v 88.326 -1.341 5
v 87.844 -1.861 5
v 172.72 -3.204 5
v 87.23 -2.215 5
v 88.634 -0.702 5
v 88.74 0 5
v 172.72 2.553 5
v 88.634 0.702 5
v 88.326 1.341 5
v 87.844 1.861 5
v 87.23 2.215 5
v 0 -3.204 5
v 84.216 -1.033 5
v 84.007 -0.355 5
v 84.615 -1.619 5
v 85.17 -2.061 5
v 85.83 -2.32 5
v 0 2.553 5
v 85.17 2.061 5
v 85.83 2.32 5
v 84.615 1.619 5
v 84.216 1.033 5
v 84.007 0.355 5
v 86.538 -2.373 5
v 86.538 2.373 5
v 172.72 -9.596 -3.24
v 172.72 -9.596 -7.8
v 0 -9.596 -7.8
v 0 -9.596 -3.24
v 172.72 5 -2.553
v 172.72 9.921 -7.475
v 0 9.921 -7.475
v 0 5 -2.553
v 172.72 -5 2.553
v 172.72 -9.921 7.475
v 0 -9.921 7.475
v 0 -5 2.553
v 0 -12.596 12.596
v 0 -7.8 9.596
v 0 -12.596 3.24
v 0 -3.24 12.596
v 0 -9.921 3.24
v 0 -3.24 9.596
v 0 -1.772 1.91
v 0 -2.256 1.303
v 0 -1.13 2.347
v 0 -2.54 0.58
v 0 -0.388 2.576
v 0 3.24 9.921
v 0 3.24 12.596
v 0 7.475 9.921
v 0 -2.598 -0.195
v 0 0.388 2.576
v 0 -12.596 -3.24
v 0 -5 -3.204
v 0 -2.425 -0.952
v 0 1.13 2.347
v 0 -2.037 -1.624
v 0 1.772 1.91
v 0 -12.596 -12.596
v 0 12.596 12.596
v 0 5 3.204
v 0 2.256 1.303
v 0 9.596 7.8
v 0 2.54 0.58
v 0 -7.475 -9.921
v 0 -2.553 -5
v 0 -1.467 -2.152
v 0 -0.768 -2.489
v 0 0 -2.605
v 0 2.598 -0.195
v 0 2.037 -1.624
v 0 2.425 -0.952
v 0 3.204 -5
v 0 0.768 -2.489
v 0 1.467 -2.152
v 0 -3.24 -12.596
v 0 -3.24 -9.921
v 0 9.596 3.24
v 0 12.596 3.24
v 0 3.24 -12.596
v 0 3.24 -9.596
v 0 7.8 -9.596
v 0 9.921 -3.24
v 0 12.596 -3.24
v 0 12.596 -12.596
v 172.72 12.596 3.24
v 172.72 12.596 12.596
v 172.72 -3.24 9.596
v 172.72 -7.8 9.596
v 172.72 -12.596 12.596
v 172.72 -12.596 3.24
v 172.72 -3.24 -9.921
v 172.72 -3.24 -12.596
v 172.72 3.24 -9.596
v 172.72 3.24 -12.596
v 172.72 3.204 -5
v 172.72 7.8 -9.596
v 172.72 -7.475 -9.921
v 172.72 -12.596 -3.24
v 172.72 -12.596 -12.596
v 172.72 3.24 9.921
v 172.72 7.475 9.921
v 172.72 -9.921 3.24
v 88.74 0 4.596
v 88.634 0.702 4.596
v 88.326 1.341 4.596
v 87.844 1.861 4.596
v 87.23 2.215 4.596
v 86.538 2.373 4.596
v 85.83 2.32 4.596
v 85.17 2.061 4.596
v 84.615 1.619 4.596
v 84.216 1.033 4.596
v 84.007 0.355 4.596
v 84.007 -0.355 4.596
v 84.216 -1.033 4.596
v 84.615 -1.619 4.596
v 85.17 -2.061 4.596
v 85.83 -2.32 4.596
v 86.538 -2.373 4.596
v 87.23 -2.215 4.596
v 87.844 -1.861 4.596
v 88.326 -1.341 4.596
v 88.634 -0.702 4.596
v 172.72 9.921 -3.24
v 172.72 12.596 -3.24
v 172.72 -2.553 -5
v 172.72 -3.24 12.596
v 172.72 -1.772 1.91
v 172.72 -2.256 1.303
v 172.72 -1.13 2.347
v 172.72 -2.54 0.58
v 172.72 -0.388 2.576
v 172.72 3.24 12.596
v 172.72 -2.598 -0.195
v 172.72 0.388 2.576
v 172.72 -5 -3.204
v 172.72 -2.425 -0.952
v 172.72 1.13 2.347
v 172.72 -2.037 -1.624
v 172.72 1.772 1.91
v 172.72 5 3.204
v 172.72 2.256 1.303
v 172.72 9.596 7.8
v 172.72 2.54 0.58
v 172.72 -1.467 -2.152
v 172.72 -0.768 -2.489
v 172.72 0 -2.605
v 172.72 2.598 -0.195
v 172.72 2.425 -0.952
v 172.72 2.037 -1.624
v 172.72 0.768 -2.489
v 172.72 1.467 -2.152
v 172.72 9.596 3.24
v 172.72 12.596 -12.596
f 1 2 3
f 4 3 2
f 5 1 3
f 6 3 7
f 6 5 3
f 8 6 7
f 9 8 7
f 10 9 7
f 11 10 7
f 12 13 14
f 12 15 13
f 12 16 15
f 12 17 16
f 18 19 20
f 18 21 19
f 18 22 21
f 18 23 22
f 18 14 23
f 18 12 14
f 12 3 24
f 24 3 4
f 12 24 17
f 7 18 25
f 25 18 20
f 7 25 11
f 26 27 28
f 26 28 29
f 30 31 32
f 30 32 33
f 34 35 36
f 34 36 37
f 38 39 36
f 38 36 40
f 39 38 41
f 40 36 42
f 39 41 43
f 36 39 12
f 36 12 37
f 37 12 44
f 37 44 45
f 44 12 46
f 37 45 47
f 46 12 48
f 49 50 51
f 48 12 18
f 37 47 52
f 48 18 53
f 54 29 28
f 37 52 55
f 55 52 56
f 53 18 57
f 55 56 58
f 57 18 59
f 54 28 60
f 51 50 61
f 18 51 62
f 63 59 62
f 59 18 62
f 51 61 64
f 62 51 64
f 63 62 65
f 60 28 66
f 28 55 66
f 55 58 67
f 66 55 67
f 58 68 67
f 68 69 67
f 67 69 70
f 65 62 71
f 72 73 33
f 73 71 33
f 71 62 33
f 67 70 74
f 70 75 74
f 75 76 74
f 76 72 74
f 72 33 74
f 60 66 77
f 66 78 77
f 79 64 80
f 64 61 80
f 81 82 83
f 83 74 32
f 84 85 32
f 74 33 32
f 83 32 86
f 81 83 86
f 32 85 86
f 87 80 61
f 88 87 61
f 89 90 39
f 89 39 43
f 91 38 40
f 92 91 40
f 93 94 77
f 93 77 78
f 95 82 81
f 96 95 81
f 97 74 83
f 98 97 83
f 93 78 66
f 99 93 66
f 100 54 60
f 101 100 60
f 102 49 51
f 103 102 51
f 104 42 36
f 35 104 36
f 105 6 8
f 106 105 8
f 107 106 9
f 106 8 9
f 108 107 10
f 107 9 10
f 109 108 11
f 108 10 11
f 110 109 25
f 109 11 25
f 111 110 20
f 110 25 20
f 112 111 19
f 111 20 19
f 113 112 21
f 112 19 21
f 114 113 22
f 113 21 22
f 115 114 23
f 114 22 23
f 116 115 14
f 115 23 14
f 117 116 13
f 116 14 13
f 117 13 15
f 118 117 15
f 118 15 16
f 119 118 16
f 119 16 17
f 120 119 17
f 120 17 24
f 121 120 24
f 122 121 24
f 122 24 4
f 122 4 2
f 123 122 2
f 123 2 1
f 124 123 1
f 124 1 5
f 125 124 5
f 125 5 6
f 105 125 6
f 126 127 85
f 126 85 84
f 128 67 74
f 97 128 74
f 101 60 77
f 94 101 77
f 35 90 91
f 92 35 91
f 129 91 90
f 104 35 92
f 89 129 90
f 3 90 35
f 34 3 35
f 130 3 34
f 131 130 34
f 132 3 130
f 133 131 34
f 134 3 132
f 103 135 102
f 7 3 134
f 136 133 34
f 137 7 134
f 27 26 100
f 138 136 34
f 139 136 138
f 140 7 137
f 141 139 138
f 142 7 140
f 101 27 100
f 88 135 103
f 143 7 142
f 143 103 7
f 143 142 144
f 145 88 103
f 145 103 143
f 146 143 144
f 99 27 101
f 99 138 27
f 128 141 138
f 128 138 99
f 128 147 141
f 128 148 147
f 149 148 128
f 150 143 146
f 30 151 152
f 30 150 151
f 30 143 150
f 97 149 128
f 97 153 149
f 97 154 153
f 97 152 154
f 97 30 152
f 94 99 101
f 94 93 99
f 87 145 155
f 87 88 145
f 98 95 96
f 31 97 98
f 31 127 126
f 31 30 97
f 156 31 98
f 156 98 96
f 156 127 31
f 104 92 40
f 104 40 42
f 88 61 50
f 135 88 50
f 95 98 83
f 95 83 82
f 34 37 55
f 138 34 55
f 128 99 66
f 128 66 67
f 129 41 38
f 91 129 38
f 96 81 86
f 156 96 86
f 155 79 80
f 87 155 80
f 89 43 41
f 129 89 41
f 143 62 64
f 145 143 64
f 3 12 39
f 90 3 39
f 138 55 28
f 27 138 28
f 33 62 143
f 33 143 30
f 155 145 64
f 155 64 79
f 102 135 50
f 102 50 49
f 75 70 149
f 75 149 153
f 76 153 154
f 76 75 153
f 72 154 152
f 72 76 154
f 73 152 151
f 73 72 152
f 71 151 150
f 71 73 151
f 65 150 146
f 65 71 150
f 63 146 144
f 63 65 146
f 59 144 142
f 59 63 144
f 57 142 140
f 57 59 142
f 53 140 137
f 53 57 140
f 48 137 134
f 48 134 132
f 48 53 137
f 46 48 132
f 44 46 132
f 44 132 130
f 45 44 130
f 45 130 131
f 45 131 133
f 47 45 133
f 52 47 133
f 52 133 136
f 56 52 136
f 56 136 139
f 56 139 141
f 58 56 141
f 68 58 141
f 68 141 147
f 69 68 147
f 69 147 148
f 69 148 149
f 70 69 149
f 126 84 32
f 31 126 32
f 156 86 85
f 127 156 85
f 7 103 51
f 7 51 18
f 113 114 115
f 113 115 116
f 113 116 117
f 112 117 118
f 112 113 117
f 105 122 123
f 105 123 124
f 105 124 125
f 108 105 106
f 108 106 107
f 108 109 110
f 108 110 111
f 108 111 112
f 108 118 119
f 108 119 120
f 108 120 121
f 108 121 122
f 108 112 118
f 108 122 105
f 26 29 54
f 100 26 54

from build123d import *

# Parameters (mm, degrees)
SKETCH1_R           = 2.605
BOSS_EXTRUDE1_DEPTH = 172.72
CIRPATTERN1_COUNT   = 4
SKETCH2_R           = 2.38
CUT_EXTRUDE6_DEPTH  = 8


with BuildPart() as part:
    # Sketch1 → Boss-Extrude1 (new body)
    with BuildSketch(Plane(origin=(0, 0, 0), x_dir=(0, 0, -1), z_dir=(1, 0, 0))):
        Polygon((5, -5), (5, 3.203948776), (9.596194078, 7.800142853), (9.596194078, 3.24), (12.596194078, 3.24), (12.596194078, 12.596194078), (3.24, 12.596194078), (3.24, 9.921463197), (7.474873734, 9.921463197), (2.553410537, 5), (-5, 5), (-5, -5), align=None)
        Circle(SKETCH1_R, mode=Mode.SUBTRACT)
    boss_extrude1 = extrude(amount=BOSS_EXTRUDE1_DEPTH)

    # CirPattern1: Boss-Extrude1 ×4 about axis
    cirpattern1_axis = Axis((0, 0, 0), (1, 0, 0))
    for i in range(1, CIRPATTERN1_COUNT):
        add(boss_extrude1.rotate(cirpattern1_axis, i * 360 / CIRPATTERN1_COUNT))

    # Sketch2 → Cut-Extrude6 (cut)
    with BuildSketch(Plane.XY.offset(12.596194078)):
        with Locations((86.36, 0)):
            Circle(SKETCH2_R)
    extrude(amount=-CUT_EXTRUDE6_DEPTH, mode=Mode.SUBTRACT)


solid = part.part
